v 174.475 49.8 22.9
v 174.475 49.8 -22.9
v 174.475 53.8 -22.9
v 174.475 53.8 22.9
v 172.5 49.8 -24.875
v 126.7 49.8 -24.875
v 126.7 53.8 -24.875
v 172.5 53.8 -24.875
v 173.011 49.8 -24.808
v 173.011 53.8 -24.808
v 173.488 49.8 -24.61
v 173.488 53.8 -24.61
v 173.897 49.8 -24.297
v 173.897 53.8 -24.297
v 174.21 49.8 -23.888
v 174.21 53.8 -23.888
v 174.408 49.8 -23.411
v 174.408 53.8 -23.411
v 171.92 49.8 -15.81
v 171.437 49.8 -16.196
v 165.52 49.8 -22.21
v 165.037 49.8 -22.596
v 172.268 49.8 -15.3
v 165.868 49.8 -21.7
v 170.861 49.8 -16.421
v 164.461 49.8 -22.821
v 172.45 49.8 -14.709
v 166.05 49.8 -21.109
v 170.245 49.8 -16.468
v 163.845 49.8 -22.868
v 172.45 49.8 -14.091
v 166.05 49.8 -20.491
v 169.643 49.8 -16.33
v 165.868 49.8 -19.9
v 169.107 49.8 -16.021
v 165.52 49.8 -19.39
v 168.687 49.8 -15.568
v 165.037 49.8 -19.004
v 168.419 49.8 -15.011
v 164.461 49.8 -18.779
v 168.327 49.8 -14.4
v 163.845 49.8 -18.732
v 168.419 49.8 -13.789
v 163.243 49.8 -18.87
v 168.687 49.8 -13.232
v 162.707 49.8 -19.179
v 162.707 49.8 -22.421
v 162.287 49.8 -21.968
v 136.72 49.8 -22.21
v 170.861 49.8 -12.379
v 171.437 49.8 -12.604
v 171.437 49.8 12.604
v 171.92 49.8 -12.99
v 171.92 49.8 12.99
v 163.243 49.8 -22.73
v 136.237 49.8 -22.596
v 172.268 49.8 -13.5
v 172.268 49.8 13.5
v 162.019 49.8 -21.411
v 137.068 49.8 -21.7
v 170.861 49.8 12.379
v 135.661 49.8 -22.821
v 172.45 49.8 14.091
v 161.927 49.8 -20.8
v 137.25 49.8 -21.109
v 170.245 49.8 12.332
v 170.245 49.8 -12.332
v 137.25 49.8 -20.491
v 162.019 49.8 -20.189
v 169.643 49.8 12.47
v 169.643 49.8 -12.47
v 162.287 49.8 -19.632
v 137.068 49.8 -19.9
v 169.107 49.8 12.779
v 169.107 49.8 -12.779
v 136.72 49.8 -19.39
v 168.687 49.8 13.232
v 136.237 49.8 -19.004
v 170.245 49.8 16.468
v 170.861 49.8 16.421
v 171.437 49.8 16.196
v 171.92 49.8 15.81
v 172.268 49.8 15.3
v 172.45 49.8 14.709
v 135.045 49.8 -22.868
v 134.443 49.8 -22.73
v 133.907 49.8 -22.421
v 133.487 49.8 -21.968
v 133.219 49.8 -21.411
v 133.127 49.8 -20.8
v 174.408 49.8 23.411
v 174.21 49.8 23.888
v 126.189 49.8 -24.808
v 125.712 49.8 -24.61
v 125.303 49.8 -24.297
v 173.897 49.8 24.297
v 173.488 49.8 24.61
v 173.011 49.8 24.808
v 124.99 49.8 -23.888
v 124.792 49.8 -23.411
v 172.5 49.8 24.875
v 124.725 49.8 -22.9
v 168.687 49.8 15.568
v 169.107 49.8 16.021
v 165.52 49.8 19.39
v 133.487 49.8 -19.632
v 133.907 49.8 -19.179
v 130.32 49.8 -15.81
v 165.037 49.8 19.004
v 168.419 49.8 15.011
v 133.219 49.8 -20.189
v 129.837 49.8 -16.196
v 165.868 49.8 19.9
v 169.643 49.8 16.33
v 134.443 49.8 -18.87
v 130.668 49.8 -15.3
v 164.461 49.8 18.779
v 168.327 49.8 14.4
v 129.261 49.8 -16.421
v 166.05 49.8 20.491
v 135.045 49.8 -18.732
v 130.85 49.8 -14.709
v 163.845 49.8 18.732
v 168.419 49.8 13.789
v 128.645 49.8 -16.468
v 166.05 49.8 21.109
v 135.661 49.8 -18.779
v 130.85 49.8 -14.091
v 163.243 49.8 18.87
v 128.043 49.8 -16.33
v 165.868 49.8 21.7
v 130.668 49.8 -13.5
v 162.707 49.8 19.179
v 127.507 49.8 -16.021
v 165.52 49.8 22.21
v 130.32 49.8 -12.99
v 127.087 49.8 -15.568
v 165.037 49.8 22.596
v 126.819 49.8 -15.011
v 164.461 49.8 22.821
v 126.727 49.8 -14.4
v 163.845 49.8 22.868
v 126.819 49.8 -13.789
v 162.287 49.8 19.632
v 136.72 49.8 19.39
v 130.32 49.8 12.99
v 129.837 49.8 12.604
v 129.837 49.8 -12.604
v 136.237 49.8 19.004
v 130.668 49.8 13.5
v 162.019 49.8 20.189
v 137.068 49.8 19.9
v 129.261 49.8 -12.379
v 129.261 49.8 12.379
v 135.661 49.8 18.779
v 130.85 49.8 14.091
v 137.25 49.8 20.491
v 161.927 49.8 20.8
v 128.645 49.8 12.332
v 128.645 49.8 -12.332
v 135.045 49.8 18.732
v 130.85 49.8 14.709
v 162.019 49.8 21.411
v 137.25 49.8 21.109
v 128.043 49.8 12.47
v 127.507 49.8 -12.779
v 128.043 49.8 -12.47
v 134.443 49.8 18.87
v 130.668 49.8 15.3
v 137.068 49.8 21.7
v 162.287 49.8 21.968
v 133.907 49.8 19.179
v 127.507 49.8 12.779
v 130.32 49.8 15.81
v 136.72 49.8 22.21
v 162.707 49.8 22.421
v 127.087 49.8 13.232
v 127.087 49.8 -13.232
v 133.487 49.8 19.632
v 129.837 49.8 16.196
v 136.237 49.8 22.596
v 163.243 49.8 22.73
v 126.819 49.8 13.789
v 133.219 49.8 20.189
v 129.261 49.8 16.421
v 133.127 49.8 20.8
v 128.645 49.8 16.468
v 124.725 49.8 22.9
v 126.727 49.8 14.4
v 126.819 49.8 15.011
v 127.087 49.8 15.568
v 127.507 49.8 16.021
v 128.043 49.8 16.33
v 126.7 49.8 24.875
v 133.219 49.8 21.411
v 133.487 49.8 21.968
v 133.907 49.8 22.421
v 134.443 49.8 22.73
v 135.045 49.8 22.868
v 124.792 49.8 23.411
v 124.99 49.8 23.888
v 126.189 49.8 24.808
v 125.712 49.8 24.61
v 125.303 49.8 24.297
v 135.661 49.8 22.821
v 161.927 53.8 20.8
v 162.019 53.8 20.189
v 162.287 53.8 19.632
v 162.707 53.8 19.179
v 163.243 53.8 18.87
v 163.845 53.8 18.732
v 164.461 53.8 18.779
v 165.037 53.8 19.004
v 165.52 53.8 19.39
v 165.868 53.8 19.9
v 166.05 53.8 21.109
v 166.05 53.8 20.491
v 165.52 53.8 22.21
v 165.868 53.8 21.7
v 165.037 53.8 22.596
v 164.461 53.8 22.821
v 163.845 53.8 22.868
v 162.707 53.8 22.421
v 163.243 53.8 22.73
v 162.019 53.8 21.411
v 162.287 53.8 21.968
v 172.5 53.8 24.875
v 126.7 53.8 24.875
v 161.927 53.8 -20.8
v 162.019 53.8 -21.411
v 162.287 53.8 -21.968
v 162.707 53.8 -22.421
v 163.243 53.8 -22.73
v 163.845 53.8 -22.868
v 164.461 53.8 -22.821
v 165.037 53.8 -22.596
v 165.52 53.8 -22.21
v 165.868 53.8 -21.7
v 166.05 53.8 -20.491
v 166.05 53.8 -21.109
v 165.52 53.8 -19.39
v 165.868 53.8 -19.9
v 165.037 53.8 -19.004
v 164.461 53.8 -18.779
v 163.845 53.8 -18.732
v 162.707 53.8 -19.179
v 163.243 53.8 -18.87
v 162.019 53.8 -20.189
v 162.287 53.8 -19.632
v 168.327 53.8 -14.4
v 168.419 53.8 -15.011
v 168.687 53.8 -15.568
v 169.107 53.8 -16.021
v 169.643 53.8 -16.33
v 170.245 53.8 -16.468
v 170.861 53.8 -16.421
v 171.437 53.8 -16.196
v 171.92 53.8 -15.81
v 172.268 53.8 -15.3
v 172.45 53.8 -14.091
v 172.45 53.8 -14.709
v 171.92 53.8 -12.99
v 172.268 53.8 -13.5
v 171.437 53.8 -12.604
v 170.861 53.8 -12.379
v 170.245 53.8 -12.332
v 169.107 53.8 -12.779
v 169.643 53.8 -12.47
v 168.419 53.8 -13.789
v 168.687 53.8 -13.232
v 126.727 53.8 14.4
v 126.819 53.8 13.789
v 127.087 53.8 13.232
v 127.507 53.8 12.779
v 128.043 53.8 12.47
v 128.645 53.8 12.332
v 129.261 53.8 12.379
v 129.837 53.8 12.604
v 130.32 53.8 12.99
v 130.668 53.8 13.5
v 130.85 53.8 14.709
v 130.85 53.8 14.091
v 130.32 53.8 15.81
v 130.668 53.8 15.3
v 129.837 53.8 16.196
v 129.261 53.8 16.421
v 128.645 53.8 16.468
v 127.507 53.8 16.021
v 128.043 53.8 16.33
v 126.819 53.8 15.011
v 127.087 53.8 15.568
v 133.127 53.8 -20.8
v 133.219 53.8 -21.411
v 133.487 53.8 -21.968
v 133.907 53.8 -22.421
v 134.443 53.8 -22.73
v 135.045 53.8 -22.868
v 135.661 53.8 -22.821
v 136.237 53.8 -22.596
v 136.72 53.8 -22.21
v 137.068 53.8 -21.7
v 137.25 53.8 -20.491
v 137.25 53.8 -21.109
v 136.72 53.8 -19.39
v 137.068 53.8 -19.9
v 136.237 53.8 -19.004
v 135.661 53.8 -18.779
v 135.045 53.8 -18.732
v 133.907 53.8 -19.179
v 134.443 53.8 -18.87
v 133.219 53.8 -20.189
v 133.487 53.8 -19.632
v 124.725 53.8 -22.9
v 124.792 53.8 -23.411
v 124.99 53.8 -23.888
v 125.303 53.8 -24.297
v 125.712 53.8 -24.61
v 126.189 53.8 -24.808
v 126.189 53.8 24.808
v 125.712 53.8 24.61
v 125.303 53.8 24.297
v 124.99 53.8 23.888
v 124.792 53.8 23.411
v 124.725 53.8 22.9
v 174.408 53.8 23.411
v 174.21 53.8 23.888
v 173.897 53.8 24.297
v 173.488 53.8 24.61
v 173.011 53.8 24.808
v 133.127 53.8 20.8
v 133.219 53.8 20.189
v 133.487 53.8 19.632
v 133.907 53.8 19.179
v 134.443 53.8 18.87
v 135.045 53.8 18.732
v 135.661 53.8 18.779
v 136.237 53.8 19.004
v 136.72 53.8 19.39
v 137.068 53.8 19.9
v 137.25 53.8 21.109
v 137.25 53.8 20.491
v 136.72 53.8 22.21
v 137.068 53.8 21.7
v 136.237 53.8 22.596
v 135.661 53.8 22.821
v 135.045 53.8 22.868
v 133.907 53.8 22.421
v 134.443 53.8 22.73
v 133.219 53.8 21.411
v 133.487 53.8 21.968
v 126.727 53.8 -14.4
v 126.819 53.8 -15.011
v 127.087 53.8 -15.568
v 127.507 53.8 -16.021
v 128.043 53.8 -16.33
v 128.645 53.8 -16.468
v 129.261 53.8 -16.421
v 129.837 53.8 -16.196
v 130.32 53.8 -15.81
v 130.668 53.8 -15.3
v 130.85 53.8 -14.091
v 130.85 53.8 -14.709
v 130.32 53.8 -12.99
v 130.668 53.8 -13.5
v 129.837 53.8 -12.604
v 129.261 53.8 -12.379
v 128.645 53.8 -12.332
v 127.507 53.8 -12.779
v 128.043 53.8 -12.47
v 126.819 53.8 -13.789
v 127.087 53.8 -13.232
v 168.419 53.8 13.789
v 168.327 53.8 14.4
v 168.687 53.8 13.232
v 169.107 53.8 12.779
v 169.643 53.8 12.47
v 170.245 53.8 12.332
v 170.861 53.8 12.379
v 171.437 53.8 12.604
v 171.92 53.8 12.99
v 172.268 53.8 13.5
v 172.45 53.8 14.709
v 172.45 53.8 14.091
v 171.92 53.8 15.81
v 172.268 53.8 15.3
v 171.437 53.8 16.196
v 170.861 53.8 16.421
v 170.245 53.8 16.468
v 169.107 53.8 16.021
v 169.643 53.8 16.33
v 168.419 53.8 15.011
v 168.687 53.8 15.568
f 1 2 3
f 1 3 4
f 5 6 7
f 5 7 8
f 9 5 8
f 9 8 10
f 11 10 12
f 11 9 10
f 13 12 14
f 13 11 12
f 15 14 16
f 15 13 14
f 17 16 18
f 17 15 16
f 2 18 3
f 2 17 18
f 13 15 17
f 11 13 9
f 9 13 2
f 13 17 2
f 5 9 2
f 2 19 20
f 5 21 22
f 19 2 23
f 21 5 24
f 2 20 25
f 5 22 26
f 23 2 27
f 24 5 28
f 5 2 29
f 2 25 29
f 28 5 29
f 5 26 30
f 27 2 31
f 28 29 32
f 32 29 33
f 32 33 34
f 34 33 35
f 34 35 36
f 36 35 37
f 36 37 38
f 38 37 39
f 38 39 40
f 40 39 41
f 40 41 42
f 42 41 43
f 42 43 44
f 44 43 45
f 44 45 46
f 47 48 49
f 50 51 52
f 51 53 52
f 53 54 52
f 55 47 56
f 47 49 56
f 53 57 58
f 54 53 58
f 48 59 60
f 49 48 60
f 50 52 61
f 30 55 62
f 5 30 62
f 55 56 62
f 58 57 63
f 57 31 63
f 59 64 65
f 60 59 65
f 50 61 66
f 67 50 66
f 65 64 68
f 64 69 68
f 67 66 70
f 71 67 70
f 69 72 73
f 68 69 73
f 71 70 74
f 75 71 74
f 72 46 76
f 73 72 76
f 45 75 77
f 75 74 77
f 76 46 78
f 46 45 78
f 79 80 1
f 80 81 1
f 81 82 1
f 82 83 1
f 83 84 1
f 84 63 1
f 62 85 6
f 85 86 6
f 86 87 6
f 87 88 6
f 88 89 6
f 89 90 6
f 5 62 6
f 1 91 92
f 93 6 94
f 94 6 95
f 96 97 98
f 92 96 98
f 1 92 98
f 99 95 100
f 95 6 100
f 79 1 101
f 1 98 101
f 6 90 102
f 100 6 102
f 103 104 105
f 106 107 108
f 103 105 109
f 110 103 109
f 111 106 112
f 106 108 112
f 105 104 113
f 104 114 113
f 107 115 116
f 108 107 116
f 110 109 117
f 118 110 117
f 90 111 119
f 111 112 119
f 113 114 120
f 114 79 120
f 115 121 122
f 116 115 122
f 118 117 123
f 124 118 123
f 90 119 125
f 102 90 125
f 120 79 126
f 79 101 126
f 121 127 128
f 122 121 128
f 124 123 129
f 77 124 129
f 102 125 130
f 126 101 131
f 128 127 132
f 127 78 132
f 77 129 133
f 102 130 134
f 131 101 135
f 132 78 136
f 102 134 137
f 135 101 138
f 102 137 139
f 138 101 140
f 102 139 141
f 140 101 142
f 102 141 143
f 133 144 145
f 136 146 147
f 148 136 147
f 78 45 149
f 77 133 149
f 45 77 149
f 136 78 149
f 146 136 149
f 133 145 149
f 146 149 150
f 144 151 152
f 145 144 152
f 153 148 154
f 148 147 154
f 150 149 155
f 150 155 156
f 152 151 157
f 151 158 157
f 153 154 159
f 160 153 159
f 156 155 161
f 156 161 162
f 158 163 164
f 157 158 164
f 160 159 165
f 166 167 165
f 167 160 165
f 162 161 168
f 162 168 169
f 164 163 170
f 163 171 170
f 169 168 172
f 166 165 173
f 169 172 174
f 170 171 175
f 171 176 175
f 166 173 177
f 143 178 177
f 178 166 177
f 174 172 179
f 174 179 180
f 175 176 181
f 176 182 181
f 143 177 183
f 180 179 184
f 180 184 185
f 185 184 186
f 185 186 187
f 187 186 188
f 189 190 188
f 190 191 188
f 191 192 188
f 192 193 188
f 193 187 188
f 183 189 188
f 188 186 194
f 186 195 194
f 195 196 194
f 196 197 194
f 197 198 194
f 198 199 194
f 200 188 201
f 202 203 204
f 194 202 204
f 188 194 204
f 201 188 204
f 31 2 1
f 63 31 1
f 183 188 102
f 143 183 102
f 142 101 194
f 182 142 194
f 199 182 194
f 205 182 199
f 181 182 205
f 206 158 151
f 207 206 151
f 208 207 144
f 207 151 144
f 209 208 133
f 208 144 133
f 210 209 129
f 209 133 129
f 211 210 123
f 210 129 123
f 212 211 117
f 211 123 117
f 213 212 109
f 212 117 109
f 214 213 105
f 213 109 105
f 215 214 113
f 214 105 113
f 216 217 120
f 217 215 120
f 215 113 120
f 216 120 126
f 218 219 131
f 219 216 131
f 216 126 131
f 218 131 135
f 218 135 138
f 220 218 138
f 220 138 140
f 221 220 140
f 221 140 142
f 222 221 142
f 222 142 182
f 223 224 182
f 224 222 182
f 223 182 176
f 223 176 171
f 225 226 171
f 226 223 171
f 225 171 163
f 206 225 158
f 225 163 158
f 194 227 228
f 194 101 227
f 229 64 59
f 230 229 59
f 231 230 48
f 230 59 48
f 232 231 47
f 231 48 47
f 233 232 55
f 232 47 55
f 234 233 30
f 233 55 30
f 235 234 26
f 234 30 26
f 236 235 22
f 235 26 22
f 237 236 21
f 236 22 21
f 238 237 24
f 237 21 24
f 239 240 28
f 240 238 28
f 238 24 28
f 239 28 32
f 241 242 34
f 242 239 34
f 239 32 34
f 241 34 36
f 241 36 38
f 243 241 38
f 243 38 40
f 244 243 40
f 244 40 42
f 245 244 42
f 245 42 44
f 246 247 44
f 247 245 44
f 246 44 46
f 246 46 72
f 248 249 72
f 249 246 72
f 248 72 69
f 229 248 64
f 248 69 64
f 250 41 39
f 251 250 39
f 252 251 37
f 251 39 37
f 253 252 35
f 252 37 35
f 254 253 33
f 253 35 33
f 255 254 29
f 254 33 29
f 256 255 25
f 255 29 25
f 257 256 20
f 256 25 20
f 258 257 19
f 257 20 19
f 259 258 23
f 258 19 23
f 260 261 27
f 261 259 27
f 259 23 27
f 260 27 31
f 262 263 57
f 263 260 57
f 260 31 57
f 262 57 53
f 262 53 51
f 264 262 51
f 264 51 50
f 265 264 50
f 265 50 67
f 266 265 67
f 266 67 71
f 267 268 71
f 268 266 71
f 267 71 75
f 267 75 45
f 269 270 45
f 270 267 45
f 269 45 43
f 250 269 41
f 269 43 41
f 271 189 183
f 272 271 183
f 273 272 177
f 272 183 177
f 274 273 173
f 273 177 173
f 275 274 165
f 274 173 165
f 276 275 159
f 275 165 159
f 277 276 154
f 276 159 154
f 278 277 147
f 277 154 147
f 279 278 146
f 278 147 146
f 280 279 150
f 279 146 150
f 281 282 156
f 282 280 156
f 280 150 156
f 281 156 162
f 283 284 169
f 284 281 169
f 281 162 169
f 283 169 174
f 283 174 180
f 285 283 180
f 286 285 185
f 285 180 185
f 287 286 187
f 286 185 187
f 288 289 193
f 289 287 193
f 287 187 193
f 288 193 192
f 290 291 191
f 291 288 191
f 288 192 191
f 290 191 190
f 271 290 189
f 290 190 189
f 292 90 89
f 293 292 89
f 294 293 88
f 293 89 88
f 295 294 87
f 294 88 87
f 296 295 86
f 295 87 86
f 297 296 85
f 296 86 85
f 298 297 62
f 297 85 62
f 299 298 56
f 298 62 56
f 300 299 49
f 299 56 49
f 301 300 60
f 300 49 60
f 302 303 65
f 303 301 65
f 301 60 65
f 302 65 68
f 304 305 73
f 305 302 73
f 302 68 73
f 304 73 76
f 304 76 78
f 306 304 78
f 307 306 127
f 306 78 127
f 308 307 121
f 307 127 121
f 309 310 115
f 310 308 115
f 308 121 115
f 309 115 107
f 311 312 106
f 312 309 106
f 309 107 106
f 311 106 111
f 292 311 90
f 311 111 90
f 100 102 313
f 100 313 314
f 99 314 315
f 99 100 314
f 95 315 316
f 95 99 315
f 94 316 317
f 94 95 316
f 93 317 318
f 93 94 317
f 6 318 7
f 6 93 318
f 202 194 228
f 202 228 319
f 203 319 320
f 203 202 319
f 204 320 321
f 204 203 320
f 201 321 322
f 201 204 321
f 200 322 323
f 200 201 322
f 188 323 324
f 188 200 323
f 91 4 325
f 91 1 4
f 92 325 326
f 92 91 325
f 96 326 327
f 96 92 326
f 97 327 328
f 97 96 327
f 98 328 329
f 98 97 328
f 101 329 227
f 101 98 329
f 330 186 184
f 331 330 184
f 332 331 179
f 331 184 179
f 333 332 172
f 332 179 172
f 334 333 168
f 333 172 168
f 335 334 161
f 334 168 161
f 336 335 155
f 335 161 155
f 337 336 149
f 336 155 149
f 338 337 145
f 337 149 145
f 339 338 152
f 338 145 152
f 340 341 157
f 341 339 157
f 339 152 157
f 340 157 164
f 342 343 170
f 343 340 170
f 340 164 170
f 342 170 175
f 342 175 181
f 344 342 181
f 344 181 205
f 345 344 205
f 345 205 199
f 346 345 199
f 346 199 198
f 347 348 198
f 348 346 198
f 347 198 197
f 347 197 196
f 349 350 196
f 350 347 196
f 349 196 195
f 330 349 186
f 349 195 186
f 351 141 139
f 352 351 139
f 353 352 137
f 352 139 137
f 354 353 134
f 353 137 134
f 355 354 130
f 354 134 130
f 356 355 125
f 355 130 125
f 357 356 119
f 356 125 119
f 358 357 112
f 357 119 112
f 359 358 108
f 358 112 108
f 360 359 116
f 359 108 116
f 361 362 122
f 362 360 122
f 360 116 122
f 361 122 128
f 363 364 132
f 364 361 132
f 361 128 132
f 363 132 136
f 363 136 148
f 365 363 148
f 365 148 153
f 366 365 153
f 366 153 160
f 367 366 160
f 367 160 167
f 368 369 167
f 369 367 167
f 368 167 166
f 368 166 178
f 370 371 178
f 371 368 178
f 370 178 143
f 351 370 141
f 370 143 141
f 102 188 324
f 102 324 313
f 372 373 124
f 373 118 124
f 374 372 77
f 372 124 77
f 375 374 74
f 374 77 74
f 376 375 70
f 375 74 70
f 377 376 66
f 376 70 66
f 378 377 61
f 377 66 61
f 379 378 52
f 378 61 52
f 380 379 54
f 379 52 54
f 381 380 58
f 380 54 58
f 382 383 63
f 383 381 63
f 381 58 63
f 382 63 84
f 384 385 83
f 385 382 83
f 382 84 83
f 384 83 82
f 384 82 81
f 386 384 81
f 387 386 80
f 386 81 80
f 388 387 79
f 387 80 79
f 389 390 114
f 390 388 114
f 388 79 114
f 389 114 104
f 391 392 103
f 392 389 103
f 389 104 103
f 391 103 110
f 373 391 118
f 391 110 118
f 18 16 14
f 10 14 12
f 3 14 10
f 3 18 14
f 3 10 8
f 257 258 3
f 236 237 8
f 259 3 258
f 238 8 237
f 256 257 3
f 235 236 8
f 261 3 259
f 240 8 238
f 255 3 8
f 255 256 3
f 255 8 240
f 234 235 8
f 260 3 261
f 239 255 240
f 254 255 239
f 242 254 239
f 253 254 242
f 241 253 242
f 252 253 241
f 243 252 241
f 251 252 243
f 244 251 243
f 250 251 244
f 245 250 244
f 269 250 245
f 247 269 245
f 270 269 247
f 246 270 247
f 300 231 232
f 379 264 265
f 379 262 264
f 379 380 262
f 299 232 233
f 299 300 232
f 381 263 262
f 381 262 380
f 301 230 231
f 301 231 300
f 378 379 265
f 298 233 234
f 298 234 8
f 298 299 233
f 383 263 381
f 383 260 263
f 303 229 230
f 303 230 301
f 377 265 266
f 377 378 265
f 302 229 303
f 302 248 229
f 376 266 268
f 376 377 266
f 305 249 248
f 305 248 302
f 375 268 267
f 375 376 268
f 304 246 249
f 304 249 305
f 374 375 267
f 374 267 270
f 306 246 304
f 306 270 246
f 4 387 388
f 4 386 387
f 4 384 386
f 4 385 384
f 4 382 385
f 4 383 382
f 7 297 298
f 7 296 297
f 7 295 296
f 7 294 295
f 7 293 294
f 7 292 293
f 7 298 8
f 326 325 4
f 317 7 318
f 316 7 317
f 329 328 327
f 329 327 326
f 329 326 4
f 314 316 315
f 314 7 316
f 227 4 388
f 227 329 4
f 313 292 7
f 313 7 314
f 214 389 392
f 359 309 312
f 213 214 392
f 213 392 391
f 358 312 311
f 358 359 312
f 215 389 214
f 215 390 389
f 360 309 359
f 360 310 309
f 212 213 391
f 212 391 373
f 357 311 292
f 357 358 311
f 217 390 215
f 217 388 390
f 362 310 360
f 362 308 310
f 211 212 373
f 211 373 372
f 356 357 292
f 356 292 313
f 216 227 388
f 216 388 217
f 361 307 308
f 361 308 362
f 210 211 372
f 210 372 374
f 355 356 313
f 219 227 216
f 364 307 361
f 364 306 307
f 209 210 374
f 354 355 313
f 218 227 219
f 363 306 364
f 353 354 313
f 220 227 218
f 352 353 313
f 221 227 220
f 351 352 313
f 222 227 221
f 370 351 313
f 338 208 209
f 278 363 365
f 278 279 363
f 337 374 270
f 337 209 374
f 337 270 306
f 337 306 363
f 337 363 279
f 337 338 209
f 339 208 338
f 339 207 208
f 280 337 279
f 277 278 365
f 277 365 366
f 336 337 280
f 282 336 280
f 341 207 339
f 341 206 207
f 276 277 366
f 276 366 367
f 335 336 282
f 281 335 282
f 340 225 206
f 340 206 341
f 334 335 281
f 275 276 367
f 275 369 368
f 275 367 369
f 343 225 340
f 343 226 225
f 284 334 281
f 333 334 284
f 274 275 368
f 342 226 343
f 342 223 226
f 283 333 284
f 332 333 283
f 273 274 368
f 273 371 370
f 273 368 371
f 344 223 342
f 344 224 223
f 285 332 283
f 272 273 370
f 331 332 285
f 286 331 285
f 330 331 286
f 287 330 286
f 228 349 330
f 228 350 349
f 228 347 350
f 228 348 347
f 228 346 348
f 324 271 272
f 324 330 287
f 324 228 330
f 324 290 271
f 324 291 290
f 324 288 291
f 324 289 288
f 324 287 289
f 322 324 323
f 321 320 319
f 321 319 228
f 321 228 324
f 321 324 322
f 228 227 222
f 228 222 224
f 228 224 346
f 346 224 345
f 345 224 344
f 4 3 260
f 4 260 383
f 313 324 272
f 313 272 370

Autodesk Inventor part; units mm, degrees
ref_plane "YZ Plane" through (0, 0, 0) normal (1, 0, 0) x (0, 1, 0)
ref_plane "XZ Plane" through (0, 0, 0) normal (0, 1, 0) x (-1, 0, 0)
sketch "Sketch1" plane through (0, 0, 0) normal (0, 1, 0) x (-1, 0, 0)
  line L0 (-155.225, -15) -> (-155.225, 15) projected
  line L1 (-155.225, 15) -> (-147.725, 15) projected
  line L2 (-147.725, 15) -> (-147.725, -15) projected
  line L3 (-147.725, -15) -> (-155.225, -15) projected
  circle A0 centre (-171.5, -21.9) radius 1.875 projected
  circle A1 centre (-127.7, 21.9) radius 1.875 projected
  circle A2 centre (-127.7, -21.9) radius 1.875 projected
  circle A3 centre (-171.5, 21.9) radius 1.875 projected
  circle A4 centre (-135.2, 20.8) radius 2.0734 projected
  circle A5 centre (-164, -20.8) radius 2.0734 projected
  circle A6 centre (-135.2, -20.8) radius 2.0734 projected
  circle A7 centre (-128.8, -14.4) radius 2.0734 projected
  circle A8 centre (-128.8, 14.4) radius 2.0734 projected
  circle A9 centre (-164, 20.8) radius 2.0734 projected
  circle A10 centre (-170.4, -14.4) radius 2.0734 projected
  circle A11 centre (-170.4, 14.4) radius 2.0734 projected
  line L4 (-172.5, 24.875) -> (-126.7, 24.875) projected
  arc A12 (-172.5, 24.875) -> (-174.475, 22.9) centre (-172.5, 22.9) ccw projected
  line L5 (-174.475, -22.9) -> (-174.475, 22.9) projected
  arc A13 (-174.475, -22.9) -> (-172.5, -24.875) centre (-172.5, -22.9) ccw projected
  line L6 (-126.7, -24.875) -> (-172.5, -24.875) projected
  arc A14 (-126.7, -24.875) -> (-124.725, -22.9) centre (-126.7, -22.9) ccw projected
  line L7 (-124.725, 22.9) -> (-124.725, -22.9) projected
  arc A15 (-124.725, 22.9) -> (-126.7, 24.875) centre (-126.7, 22.9) ccw projected
  point P0 (0, 0)
ref_plane "Work Plane1" through (124.725, 49.8, -24.875) normal (0, 1, 0) x (0, 0, 1)
extrude "Extrusion1" add sketch "Sketch1" along normal blind 4 from surface at 49.8 contours L0 L1 L2 L3 | A0 | A1 | A2 | A3 | L4 A15 L7 A14 L6 A13 L5 A12
properties part number "Outer Cover Top"
